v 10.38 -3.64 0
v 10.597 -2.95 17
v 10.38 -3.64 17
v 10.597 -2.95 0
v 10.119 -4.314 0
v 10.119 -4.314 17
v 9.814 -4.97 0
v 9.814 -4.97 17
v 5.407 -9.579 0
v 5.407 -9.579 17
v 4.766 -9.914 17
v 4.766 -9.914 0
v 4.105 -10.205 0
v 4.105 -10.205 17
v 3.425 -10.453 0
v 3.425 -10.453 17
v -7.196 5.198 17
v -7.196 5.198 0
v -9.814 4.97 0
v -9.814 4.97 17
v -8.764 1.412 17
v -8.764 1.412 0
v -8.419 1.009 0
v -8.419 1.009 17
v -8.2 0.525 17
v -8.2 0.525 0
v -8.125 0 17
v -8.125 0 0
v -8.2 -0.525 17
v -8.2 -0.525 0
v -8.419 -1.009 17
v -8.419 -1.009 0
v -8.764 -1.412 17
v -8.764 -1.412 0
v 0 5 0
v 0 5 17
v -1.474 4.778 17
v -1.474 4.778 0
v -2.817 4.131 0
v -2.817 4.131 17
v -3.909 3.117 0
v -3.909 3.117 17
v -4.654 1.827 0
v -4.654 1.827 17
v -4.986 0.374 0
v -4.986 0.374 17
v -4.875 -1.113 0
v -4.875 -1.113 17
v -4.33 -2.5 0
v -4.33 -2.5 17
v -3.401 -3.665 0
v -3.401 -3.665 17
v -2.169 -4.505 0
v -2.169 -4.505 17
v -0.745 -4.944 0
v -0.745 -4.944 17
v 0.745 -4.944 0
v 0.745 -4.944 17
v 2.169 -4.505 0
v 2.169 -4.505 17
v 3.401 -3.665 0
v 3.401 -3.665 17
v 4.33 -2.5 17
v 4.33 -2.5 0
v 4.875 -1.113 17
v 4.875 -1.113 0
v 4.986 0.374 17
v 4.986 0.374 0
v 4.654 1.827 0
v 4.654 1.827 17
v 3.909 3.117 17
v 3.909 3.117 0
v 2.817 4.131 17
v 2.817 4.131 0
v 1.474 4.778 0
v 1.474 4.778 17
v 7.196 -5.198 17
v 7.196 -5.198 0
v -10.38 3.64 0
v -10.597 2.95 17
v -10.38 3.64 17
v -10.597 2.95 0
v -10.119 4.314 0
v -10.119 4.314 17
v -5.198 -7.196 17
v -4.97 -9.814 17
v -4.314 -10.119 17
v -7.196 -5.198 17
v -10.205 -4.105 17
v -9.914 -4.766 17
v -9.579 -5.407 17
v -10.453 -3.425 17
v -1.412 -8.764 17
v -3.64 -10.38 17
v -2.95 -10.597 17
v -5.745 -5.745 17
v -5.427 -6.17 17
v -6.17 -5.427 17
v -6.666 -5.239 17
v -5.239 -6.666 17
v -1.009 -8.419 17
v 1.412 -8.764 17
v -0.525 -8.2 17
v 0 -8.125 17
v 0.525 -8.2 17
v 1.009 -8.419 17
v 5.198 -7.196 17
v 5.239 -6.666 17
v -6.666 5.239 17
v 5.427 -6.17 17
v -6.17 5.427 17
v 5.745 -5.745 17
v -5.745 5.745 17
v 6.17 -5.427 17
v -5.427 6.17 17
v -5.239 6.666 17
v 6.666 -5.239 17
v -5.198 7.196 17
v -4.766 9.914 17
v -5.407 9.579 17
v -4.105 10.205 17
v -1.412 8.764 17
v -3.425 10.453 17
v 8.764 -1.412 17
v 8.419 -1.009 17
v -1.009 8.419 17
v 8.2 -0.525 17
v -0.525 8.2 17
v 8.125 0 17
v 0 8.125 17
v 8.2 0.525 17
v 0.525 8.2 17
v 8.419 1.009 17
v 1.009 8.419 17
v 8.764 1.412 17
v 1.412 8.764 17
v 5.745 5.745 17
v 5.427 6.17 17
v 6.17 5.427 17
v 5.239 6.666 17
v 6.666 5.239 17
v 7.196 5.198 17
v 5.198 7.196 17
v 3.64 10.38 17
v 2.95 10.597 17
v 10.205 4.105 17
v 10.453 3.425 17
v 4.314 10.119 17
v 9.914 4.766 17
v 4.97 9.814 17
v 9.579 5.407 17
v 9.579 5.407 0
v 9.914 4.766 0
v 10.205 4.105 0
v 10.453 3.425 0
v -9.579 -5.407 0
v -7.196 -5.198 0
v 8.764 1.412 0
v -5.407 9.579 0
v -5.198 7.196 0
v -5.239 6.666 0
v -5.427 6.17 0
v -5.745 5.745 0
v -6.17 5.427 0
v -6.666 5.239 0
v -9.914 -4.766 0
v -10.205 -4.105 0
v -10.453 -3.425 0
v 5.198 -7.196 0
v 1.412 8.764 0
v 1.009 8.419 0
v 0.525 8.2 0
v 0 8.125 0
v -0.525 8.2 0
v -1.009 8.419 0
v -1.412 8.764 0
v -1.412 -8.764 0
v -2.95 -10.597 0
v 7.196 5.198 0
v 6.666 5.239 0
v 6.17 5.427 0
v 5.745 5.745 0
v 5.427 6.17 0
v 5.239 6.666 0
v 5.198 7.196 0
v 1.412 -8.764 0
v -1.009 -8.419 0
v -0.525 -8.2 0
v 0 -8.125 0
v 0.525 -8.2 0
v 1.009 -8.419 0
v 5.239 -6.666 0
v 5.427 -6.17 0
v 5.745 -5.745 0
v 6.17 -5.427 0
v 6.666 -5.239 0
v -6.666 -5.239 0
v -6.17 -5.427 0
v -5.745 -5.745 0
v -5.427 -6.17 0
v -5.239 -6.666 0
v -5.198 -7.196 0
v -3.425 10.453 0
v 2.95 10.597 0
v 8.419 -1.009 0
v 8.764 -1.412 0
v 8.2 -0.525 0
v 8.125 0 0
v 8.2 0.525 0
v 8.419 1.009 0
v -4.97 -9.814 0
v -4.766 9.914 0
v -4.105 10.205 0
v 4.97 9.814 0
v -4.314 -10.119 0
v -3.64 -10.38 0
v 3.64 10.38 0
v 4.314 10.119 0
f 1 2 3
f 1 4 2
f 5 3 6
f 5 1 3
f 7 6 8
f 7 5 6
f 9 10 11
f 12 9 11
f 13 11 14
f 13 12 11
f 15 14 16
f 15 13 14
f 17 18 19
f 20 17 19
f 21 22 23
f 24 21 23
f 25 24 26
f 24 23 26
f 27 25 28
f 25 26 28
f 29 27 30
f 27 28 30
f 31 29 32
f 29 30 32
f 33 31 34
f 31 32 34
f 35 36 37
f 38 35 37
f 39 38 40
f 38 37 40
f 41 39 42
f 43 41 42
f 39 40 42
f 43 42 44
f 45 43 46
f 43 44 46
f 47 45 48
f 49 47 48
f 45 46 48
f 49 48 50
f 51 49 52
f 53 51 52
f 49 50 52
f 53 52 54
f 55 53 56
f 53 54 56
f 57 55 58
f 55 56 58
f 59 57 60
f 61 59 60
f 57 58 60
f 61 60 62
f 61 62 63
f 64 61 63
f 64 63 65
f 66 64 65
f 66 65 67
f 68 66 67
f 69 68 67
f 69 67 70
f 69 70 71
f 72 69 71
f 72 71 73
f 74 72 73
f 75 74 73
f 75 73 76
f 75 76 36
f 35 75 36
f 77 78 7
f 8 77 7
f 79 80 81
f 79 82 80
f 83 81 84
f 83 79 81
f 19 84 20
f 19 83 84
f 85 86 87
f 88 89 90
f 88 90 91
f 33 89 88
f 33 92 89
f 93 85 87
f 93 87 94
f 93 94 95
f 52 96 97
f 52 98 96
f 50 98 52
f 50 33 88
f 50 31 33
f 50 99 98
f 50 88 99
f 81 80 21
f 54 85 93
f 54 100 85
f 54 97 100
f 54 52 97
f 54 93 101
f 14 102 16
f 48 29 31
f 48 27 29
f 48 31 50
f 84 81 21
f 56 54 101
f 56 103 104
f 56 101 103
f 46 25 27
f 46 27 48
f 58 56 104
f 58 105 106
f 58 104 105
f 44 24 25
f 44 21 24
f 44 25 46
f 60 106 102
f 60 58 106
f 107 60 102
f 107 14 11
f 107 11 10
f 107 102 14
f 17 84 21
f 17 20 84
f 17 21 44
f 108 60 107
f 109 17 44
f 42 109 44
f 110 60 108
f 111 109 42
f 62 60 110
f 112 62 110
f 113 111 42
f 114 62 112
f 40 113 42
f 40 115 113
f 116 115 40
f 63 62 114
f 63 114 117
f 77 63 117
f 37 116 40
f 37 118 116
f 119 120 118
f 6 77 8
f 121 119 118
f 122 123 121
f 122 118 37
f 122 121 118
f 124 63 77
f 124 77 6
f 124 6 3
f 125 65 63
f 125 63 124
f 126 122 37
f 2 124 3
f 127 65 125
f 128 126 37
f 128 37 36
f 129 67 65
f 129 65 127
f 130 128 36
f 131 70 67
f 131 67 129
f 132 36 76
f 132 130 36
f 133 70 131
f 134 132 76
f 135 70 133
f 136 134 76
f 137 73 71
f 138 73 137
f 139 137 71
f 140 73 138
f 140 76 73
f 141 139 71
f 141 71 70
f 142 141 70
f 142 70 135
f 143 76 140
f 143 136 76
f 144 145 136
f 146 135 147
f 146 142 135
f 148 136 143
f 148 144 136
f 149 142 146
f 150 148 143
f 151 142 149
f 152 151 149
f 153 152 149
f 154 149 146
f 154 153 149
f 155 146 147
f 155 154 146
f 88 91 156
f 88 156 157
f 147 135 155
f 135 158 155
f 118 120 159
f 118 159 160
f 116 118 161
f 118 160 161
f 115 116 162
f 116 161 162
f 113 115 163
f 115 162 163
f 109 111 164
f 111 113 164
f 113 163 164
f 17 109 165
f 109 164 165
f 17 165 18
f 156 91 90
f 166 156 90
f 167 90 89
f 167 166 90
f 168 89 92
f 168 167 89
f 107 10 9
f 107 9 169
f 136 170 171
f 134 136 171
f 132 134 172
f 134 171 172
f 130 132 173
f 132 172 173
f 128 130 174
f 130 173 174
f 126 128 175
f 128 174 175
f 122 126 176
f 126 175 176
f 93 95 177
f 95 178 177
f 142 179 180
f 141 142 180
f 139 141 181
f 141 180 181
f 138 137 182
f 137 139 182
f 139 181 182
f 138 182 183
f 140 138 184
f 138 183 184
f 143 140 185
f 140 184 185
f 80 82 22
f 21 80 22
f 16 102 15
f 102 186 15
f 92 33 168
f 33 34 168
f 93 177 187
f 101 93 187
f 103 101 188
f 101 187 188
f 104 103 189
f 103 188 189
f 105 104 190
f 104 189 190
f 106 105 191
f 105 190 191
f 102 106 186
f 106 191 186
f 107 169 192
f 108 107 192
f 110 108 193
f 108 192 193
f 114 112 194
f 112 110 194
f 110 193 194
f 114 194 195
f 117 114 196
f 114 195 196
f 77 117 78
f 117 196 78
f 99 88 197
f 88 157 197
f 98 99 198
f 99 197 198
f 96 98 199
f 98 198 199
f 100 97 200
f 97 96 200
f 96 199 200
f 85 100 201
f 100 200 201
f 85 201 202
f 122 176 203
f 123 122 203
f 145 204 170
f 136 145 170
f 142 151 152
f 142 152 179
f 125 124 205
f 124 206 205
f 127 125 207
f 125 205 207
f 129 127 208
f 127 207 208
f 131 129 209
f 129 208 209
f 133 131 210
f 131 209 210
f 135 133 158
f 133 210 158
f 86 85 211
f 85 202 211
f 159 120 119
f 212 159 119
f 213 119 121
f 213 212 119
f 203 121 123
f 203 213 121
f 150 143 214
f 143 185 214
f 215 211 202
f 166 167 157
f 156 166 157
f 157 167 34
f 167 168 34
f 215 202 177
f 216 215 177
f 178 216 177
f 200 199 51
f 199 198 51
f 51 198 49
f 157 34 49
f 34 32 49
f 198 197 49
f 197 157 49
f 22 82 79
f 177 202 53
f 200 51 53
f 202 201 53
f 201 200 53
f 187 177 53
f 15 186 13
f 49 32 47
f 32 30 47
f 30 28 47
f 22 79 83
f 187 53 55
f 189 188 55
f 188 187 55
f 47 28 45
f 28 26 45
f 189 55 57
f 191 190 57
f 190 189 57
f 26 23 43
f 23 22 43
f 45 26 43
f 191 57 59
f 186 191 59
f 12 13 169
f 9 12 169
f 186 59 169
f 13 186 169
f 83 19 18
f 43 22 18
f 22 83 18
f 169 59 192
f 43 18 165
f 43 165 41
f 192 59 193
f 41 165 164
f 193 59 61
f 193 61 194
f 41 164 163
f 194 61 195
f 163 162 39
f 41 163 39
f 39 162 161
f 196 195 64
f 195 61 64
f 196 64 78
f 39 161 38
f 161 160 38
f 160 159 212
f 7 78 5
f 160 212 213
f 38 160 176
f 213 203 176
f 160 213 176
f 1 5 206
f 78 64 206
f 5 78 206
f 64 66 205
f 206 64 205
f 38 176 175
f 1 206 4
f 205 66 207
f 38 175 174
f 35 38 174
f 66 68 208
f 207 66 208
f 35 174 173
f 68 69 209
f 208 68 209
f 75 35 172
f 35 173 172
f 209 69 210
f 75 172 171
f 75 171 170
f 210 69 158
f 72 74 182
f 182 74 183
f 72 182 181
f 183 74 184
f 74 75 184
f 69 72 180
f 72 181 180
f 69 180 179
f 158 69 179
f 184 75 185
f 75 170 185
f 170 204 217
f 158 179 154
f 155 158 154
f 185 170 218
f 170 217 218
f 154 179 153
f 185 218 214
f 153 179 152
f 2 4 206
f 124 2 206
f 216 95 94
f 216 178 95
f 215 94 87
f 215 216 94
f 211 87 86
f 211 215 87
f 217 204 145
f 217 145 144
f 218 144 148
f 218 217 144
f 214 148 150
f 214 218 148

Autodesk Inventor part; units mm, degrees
sketch "Sketch_1" plane through (0, 0, 0) normal (0, 0, 1) x (1, 0, 0)
  line L0 (-10.597, 2.9503) -> (-8.764, 1.4122)
  arc A0 (-8.764, -1.4122) -> (-8.764, 1.4122) centre (-10.005, 0) ccw
  line L1 (-8.764, -1.4122) -> (-10.4531, -3.4252)
  arc A1 (-10.4531, -3.4252) -> (-9.5793, -5.4071) centre (0, 0) ccw
  line L2 (-9.5793, -5.4071) -> (-7.1956, -5.1985)
  arc A2 (-5.1985, -7.1956) -> (-7.1956, -5.1985) centre (-7.0746, -7.0746) ccw
  line L3 (-5.1985, -7.1956) -> (-4.9695, -9.8135)
  arc A3 (-4.9695, -9.8135) -> (-2.9503, -10.597) centre (0, 0) ccw
  line L4 (-2.9503, -10.597) -> (-1.4122, -8.764)
  arc A4 (1.4122, -8.764) -> (-1.4122, -8.764) centre (0, -10.005) ccw
  line L5 (1.4122, -8.764) -> (3.4252, -10.4531)
  arc A5 (3.4252, -10.4531) -> (5.4071, -9.5793) centre (0, 0) ccw
  line L6 (5.4071, -9.5793) -> (5.1985, -7.1956)
  arc A6 (7.1956, -5.1985) -> (5.1985, -7.1956) centre (7.0746, -7.0746) ccw
  line L7 (7.1956, -5.1985) -> (9.8135, -4.9695)
  arc A7 (9.8135, -4.9695) -> (10.597, -2.9503) centre (0, 0) ccw
  line L8 (10.597, -2.9503) -> (8.764, -1.4122)
  arc A8 (8.764, 1.4122) -> (8.764, -1.4122) centre (10.005, 0) ccw
  line L9 (8.764, 1.4122) -> (10.4531, 3.4252)
  arc A9 (10.4531, 3.4252) -> (9.5793, 5.4071) centre (0, 0) ccw
  line L10 (9.5793, 5.4071) -> (7.1956, 5.1985)
  arc A10 (5.1985, 7.1956) -> (7.1956, 5.1985) centre (7.0746, 7.0746) ccw
  line L11 (5.1985, 7.1956) -> (4.9695, 9.8135)
  arc A11 (4.9695, 9.8135) -> (2.9503, 10.597) centre (0, 0) ccw
  line L12 (2.9503, 10.597) -> (1.4122, 8.764)
  arc A12 (-1.4122, 8.764) -> (1.4122, 8.764) centre (0, 10.005) ccw
  line L13 (-1.4122, 8.764) -> (-3.4252, 10.4531)
  arc A13 (-3.4252, 10.4531) -> (-5.4071, 9.5793) centre (0, 0) ccw
  line L14 (-5.4071, 9.5793) -> (-5.1985, 7.1956)
  arc A14 (-7.1956, 5.1985) -> (-5.1985, 7.1956) centre (-7.0746, 7.0746) ccw
  line L15 (-7.1956, 5.1985) -> (-9.8135, 4.9695)
  arc A15 (-9.8135, 4.9695) -> (-10.597, 2.9503) centre (0, 0) ccw
extrude "Extrusion1" add sketch "Sketch_1" along normal blind 17
sketch "Sketch2" plane through (0, 0, 0) normal (0, 0, -1) x (-1, 0, 0)
  point P0 (0, 0)
hole "Hole1" at (0, 0, 0) direction (0, 0, 1) diameter 10 depth 17
ref_plane "left_XY" through (0, 0, 0) normal (0, 0, 1) x (1, 0, 0)
ref_plane "left_YZ" through (0, 0, 0) normal (1, 0, 0) x (0, 1, 0)
ref_plane "left_ZX" through (0, 0, 0) normal (0, 1, 0) x (0, 0, 1)
ref_plane "right_XY" through (0, 0, 17) normal (0, 0, 1) x (1, 0, 0)
ref_plane "right_YZ" through (0, 0, 17) normal (1, 0, 0) x (0, 1, 0)
ref_plane "right_ZX" through (0, 0, 17) normal (0, 1, 0) x (0, 0, 1)
properties part number "MSF-25 Sleeve"
